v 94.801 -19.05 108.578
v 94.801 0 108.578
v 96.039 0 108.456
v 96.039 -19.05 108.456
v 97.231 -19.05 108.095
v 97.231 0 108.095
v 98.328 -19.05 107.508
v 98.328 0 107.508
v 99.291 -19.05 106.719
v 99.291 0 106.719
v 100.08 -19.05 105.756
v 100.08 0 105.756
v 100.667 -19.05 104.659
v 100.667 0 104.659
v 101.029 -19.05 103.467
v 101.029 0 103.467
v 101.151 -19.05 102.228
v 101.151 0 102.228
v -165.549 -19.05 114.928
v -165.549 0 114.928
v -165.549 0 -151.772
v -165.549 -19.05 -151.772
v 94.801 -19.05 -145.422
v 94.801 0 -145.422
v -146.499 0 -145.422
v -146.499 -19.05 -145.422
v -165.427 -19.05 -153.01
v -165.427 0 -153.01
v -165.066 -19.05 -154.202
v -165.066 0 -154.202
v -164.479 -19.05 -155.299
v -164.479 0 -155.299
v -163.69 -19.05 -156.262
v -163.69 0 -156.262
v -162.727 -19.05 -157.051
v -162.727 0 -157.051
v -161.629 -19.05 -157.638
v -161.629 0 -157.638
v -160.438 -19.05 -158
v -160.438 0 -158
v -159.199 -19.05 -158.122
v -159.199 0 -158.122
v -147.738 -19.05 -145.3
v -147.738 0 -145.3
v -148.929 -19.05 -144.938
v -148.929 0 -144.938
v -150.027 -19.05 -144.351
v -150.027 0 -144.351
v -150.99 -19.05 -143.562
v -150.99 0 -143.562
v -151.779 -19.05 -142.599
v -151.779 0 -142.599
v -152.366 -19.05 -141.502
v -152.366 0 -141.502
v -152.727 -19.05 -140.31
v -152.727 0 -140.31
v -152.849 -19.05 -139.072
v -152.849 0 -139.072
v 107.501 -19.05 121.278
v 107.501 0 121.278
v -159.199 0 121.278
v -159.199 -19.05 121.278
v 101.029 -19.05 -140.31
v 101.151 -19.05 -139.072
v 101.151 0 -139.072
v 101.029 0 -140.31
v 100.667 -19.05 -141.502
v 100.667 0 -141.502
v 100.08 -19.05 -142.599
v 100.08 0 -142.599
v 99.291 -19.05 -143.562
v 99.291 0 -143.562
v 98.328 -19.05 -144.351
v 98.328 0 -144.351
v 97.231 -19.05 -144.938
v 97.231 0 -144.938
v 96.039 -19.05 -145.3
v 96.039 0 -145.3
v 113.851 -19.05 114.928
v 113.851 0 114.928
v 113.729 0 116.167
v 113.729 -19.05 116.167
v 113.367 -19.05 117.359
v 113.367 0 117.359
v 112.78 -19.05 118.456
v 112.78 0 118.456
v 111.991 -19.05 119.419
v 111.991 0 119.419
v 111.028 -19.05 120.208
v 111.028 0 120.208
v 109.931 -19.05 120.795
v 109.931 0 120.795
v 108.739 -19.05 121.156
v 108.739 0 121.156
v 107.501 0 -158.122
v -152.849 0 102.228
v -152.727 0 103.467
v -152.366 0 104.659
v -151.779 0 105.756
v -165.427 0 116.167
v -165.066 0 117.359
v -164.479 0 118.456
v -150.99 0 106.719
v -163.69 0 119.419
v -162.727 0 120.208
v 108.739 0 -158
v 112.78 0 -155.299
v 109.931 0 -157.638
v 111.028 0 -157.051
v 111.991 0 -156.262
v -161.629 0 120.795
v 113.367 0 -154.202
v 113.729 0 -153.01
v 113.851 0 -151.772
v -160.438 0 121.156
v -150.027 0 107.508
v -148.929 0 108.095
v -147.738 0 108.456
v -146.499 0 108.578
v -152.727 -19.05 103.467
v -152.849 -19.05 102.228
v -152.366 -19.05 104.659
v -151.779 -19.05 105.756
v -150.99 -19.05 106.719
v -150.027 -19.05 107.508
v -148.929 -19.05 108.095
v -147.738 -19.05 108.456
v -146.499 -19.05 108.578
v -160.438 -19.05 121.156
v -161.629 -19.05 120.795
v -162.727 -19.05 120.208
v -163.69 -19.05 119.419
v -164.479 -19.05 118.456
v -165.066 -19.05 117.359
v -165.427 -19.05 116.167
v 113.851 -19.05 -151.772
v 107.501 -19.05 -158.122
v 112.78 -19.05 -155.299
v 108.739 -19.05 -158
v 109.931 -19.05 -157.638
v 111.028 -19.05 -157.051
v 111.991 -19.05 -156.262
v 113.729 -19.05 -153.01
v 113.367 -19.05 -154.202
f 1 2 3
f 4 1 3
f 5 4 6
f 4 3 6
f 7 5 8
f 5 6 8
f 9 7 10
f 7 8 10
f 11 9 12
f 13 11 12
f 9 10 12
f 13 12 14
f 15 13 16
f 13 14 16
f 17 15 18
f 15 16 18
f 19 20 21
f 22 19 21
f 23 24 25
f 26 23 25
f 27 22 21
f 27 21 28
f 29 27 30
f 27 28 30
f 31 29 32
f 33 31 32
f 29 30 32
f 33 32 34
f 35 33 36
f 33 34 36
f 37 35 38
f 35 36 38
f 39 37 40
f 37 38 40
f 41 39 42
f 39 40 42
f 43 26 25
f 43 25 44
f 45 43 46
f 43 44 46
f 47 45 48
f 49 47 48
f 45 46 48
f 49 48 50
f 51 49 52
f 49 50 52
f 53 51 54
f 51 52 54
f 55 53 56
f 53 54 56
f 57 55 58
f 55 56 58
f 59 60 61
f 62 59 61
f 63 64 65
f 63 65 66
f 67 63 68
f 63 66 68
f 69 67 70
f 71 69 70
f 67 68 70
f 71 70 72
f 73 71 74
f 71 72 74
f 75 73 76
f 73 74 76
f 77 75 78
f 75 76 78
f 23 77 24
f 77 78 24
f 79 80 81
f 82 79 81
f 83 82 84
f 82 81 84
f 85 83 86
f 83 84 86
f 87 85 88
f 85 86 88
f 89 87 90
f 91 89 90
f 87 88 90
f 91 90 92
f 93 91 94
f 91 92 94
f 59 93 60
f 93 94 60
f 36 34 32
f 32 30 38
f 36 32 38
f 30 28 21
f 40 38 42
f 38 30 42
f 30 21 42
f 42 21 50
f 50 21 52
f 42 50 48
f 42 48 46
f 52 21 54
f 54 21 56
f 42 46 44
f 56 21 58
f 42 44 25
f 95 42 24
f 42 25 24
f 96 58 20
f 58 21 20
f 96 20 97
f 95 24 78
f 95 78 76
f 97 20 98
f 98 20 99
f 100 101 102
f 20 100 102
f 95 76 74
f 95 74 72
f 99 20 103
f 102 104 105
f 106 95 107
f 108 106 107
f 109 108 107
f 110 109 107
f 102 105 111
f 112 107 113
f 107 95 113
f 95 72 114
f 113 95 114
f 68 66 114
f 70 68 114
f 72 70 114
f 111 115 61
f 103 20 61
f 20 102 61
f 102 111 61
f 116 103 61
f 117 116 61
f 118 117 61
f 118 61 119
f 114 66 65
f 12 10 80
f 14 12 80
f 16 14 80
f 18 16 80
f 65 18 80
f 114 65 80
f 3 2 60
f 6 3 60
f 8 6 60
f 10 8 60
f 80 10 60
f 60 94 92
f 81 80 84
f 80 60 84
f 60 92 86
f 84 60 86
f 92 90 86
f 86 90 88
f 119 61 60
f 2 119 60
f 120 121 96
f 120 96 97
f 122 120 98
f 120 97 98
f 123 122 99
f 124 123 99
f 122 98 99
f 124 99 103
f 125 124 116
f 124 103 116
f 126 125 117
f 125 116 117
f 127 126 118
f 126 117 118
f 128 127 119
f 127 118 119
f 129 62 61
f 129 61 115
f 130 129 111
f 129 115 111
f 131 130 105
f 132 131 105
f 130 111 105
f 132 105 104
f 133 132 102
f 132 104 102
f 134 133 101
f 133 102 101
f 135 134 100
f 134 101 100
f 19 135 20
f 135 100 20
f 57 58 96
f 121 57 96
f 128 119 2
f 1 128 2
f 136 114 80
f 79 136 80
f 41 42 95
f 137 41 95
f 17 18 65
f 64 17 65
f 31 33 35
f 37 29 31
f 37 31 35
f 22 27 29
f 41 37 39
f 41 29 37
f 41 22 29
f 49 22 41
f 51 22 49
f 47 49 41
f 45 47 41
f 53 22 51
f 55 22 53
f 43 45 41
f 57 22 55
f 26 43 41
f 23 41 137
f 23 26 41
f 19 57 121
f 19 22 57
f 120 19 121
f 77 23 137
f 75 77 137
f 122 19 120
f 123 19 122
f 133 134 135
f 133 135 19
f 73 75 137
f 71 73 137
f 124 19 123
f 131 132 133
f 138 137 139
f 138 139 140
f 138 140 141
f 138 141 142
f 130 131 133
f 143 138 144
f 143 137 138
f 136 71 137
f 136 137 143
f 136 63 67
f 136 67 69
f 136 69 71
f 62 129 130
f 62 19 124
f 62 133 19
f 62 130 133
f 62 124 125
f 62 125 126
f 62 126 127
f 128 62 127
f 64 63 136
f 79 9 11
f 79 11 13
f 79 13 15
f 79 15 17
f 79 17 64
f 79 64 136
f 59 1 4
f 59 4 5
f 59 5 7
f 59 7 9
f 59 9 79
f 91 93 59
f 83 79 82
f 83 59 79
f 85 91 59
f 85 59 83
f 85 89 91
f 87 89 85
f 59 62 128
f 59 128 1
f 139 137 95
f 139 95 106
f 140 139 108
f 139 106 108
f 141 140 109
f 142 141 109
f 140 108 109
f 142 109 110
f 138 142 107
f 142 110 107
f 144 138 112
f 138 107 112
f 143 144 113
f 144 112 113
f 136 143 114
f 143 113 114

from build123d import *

# Parameters (mm, degrees)
F1_DEPTH = 19.05


with BuildPart() as f1:
    # F0 (on Front) → F1 (new body)
    with BuildSketch(Plane.XZ):
        with BuildLine():
            Line((-159.199445, -158.121514), (107.500555, -158.121514))
            ThreePointArc((107.500555, -158.121514), (111.990683, -156.261642), (113.850555, -151.771514))
            Line((113.850555, -151.771514), (113.850555, 114.928486))
            ThreePointArc((113.850555, 114.928486), (111.990683, 119.418614), (107.500555, 121.278486))
            Line((107.500555, 121.278486), (-159.199445, 121.278486))
            ThreePointArc((-159.199445, 121.278486), (-163.689573, 119.418614), (-165.549445, 114.928486))
            Line((-165.549445, 114.928486), (-165.549445, -151.771514))
            ThreePointArc((-165.549445, -151.771514), (-163.689573, -156.261642), (-159.199445, -158.121514))
        make_face()
        with BuildLine():
            Line((-121.099445, -145.421514), (-146.499445, -145.421514))
            ThreePointArc((-146.499445, -145.421514), (-150.989573, -143.561642), (-152.849445, -139.071514))
            Line((-152.849445, -139.071514), (-152.849445, -113.671514))
            Line((-152.849445, -113.671514), (-152.849445, -81.921514))
            Line((-152.849445, -81.921514), (-152.849445, -50.171514))
            Line((-152.849445, -50.171514), (-152.849445, -18.421514))
            Line((-152.849445, -18.421514), (-152.849445, 13.328486))
            Line((-152.849445, 13.328486), (-152.849445, 45.078486))
            Line((-152.849445, 45.078486), (-152.849445, 76.828486))
            Line((-152.849445, 76.828486), (-152.849445, 102.228486))
            ThreePointArc((-152.849445, 102.228486), (-150.989573, 106.718614), (-146.499445, 108.578486))
            Line((-146.499445, 108.578486), (-121.099445, 108.578486))
            Line((-121.099445, 108.578486), (-89.349445, 108.578486))
            Line((-89.349445, 108.578486), (-57.599445, 108.578486))
            Line((-57.599445, 108.578486), (-25.849445, 108.578486))
            Line((-25.849445, 108.578486), (5.900555, 108.578486))
            Line((5.900555, 108.578486), (37.650555, 108.578486))
            Line((37.650555, 108.578486), (69.400555, 108.578486))
            Line((69.400555, 108.578486), (94.800555, 108.578486))
            ThreePointArc((94.800555, 108.578486), (99.290683, 106.718614), (101.150555, 102.228486))
            Line((101.150555, 102.228486), (101.150555, 76.828486))
            Line((101.150555, 76.828486), (101.150555, 45.078486))
            Line((101.150555, 45.078486), (101.150555, 13.328486))
            Line((101.150555, 13.328486), (101.150555, -18.421514))
            Line((101.150555, -18.421514), (101.150555, -50.171514))
            Line((101.150555, -50.171514), (101.150555, -81.921514))
            Line((101.150555, -81.921514), (101.150555, -113.671514))
            Line((101.150555, -113.671514), (101.150555, -139.071514))
            ThreePointArc((101.150555, -139.071514), (99.290683, -143.561642), (94.800555, -145.421514))
            Line((94.800555, -145.421514), (69.400555, -145.421514))
            Line((69.400555, -145.421514), (37.650555, -145.421514))
            Line((37.650555, -145.421514), (5.900555, -145.421514))
            Line((5.900555, -145.421514), (-25.849445, -145.421514))
            Line((-25.849445, -145.421514), (-57.599445, -145.421514))
            Line((-57.599445, -145.421514), (-89.349445, -145.421514))
            Line((-89.349445, -145.421514), (-121.099445, -145.421514))
        make_face(mode=Mode.SUBTRACT)
    extrude(amount=F1_DEPTH)


solid = f1.part
